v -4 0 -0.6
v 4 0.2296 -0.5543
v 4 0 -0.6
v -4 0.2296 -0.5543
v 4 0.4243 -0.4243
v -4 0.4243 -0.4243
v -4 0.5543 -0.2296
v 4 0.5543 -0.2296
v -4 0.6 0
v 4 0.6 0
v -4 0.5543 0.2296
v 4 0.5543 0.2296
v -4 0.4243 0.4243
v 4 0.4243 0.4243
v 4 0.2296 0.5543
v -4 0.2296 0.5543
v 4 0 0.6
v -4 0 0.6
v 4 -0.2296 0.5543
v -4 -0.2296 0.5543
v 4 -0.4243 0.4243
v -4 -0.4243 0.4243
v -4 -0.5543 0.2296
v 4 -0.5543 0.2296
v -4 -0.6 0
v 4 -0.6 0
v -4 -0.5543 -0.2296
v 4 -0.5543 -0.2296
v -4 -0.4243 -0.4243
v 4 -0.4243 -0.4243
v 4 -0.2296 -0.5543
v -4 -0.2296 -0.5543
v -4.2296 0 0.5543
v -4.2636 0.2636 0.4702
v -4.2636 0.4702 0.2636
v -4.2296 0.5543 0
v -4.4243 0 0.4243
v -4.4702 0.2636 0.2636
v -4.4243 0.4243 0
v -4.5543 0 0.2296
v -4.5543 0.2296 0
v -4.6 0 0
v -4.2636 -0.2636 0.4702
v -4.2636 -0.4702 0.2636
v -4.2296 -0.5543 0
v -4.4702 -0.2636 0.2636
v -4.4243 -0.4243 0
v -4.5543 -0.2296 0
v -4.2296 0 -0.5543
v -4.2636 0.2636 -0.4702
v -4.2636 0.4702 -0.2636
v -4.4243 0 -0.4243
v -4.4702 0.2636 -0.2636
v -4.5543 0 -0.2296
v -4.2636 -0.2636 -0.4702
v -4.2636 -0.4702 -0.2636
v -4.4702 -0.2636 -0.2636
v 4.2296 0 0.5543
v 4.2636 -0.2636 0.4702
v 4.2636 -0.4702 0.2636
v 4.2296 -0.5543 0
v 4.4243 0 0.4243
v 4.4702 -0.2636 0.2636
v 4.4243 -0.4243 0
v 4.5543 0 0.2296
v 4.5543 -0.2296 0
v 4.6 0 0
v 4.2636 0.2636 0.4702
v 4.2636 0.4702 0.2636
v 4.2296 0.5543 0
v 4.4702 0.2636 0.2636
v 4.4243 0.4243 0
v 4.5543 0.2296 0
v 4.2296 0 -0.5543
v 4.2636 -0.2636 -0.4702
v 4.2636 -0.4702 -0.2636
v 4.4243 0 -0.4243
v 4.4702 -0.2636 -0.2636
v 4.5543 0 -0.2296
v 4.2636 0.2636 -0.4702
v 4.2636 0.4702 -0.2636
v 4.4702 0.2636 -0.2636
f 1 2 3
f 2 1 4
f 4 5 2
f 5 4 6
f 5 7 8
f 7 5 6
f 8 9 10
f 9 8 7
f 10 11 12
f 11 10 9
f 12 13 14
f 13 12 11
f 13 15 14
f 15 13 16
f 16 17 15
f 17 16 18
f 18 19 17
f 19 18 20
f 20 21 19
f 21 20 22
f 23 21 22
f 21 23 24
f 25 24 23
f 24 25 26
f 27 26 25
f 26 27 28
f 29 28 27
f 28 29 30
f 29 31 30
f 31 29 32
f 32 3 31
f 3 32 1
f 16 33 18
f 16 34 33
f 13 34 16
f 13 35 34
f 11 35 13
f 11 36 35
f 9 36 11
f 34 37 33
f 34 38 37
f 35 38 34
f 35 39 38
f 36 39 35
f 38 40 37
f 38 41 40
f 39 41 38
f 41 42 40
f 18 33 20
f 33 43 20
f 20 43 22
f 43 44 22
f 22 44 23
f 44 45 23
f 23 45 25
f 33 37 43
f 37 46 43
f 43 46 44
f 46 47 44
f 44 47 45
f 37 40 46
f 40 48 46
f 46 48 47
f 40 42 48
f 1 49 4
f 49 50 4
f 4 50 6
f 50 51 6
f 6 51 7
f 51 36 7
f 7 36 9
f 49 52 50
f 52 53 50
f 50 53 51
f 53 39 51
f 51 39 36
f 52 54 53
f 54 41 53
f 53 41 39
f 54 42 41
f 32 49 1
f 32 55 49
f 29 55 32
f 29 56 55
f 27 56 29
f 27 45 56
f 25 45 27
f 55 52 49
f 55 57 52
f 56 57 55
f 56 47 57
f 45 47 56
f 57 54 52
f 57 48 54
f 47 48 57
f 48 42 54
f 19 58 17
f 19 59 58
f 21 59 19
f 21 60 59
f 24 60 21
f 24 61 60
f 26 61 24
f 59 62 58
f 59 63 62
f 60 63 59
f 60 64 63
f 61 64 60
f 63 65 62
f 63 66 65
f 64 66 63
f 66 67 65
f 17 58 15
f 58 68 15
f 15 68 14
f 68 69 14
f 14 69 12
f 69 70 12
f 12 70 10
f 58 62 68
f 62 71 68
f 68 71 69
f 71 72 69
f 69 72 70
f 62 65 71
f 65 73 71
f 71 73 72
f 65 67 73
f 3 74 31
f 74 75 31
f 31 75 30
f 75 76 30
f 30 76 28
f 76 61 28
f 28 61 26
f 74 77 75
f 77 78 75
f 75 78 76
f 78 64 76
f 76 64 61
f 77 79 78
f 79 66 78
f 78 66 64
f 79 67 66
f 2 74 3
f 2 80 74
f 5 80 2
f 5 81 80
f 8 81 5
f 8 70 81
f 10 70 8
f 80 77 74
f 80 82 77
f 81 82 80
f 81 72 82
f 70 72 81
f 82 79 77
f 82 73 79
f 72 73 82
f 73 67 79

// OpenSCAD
// file: ../p/1-8sphe.scad
use <../lib.scad>
function ldraw_lib__1_8sphe() = [
// 0 Sphere 0.125
// 0 Name: 1-8sphe.dat
// 0 Author: James Jessiman
// 0 !LDRAW_ORG Primitive UPDATE 2012-03
// 0 !LICENSE Licensed under CC BY 2.0 and CC BY 4.0 : see CAreadme.txt
// 
// 0 BFC CERTIFY CCW
  [0,"BFC","CERTIFY"],
  [0,"BFC","CCW"],
// 
// 0 !HISTORY 2000-08-01 {Axel Poque} fixes to resolve L3P error messages.
// 0 !HISTORY 2000-08-01 {Manfred Moolhuysen} fixes to resolve L3P error messages.
// 0 !HISTORY 2000-09-30 [PTadmin] Official Update 2000-02
// 0 !HISTORY 2002-03-28 [hafhead] Made BFC compliant
// 0 !HISTORY 2002-04-25 [PTadmin] Official Update 2002-02
// 0 !HISTORY 2007-06-22 [PTadmin] Header formatted for Contributor Agreement
// 0 !HISTORY 2008-07-01 [PTadmin] Official Update 2008-01
// 0 !HISTORY 2010-09-12 [MagFors] Changed winding, removed duplicated cond-line, optimized filesize
// 0 !HISTORY 2010-12-31 [PTadmin] Official Update 2010-03
// 0 !HISTORY 2012-07-01 [tcobbs] Replaced with geometry from LDView
// 0 !HISTORY 2012-12-28 [PTadmin] Official Update 2012-03
// 
// 
// 3 16 1 0 0 0.9239 0.3827 0 0.9239 0 0.3827
  [3,16,1,0,0,0.9239,0.3827,0,0.9239,0,0.3827],
// 3 16 0.9239 0.3827 0 0.7836 0.4393 0.4393 0.9239 0 0.3827
  [3,16,0.9239,0.3827,0,0.7836,0.4393,0.4393,0.9239,0,0.3827],
// 3 16 0.9239 0 0.3827 0.7836 0.4393 0.4393 0.7071 0 0.7071
  [3,16,0.9239,0,0.3827,0.7836,0.4393,0.4393,0.7071,0,0.7071],
// 3 16 0.7836 0.4393 0.4393 0.4393 0.4393 0.7836 0.7071 0 0.7071
  [3,16,0.7836,0.4393,0.4393,0.4393,0.4393,0.7836,0.7071,0,0.7071],
// 3 16 0.7071 0 0.7071 0.4393 0.4393 0.7836 0.3827 0 0.9239
  [3,16,0.7071,0,0.7071,0.4393,0.4393,0.7836,0.3827,0,0.9239],
// 3 16 0.4393 0.4393 0.7836 0 0.3827 0.9239 0.3827 0 0.9239
  [3,16,0.4393,0.4393,0.7836,0,0.3827,0.9239,0.3827,0,0.9239],
// 3 16 0.3827 0 0.9239 0 0.3827 0.9239 0 0 1
  [3,16,0.3827,0,0.9239,0,0.3827,0.9239,0,0,1],
// 3 16 0.9239 0.3827 0 0.7071 0.7071 0 0.7836 0.4393 0.4393
  [3,16,0.9239,0.3827,0,0.7071,0.7071,0,0.7836,0.4393,0.4393],
// 3 16 0.7071 0.7071 0 0.4393 0.7836 0.4393 0.7836 0.4393 0.4393
  [3,16,0.7071,0.7071,0,0.4393,0.7836,0.4393,0.7836,0.4393,0.4393],
// 3 16 0.7836 0.4393 0.4393 0.4393 0.7836 0.4393 0.4393 0.4393 0.7836
  [3,16,0.7836,0.4393,0.4393,0.4393,0.7836,0.4393,0.4393,0.4393,0.7836],
// 3 16 0.4393 0.7836 0.4393 0 0.7071 0.7071 0.4393 0.4393 0.7836
  [3,16,0.4393,0.7836,0.4393,0,0.7071,0.7071,0.4393,0.4393,0.7836],
// 3 16 0.4393 0.4393 0.7836 0 0.7071 0.7071 0 0.3827 0.9239
  [3,16,0.4393,0.4393,0.7836,0,0.7071,0.7071,0,0.3827,0.9239],
// 3 16 0.7071 0.7071 0 0.3827 0.9239 0 0.4393 0.7836 0.4393
  [3,16,0.7071,0.7071,0,0.3827,0.9239,0,0.4393,0.7836,0.4393],
// 3 16 0.3827 0.9239 0 0 0.9239 0.3827 0.4393 0.7836 0.4393
  [3,16,0.3827,0.9239,0,0,0.9239,0.3827,0.4393,0.7836,0.4393],
// 3 16 0.4393 0.7836 0.4393 0 0.9239 0.3827 0 0.7071 0.7071
  [3,16,0.4393,0.7836,0.4393,0,0.9239,0.3827,0,0.7071,0.7071],
// 3 16 0.3827 0.9239 0 0 1 0 0 0.9239 0.3827
  [3,16,0.3827,0.9239,0,0,1,0,0,0.9239,0.3827],
// 
// 5 24 1 0 0 0.9239 0.3827 0 1 0 -0.1 0.9239 0 0.3827
  [5,24,1,0,0,0.9239,0.3827,0,1,0,-0.1,0.9239,0,0.3827],
// 5 24 0.9239 0.3827 0 0.9239 0 0.3827 1 0 0 0.7836 0.4393 0.4393
  [5,24,0.9239,0.3827,0,0.9239,0,0.3827,1,0,0,0.7836,0.4393,0.4393],
// 5 24 1 0 0 0.9239 0 0.3827 0.9239 0.3827 0 1 -0.1 0
  [5,24,1,0,0,0.9239,0,0.3827,0.9239,0.3827,0,1,-0.1,0],
// 5 24 0.9239 0 0.3827 0.7836 0.4393 0.4393 0.9239 0.3827 0 0.7071 0 0.7071
  [5,24,0.9239,0,0.3827,0.7836,0.4393,0.4393,0.9239,0.3827,0,0.7071,0,0.7071],
// 5 24 0.7836 0.4393 0.4393 0.7071 0 0.7071 0.9239 0 0.3827 0.4393 0.4393 0.7836
  [5,24,0.7836,0.4393,0.4393,0.7071,0,0.7071,0.9239,0,0.3827,0.4393,0.4393,0.7836],
// 5 24 0.9239 0 0.3827 0.7071 0 0.7071 0.7836 0.4393 0.4393 0.9239 -0.1 0.3827
  [5,24,0.9239,0,0.3827,0.7071,0,0.7071,0.7836,0.4393,0.4393,0.9239,-0.1,0.3827],
// 5 24 0.7071 0 0.7071 0.4393 0.4393 0.7836 0.7836 0.4393 0.4393 0.3827 0 0.9239
  [5,24,0.7071,0,0.7071,0.4393,0.4393,0.7836,0.7836,0.4393,0.4393,0.3827,0,0.9239],
// 5 24 0.4393 0.4393 0.7836 0.3827 0 0.9239 0.7071 0 0.7071 0 0.3827 0.9239
  [5,24,0.4393,0.4393,0.7836,0.3827,0,0.9239,0.7071,0,0.7071,0,0.3827,0.9239],
// 5 24 0.7071 0 0.7071 0.3827 0 0.9239 0.4393 0.4393 0.7836 0.7071 -0.1 0.7071
  [5,24,0.7071,0,0.7071,0.3827,0,0.9239,0.4393,0.4393,0.7836,0.7071,-0.1,0.7071],
// 5 24 0.3827 0 0.9239 0 0.3827 0.9239 0.4393 0.4393 0.7836 0 0 1
  [5,24,0.3827,0,0.9239,0,0.3827,0.9239,0.4393,0.4393,0.7836,0,0,1],
// 5 24 0 0.3827 0.9239 0 0 1 0.3827 0 0.9239 -0.1 0.3827 0.9239
  [5,24,0,0.3827,0.9239,0,0,1,0.3827,0,0.9239,-0.1,0.3827,0.9239],
// 5 24 0.3827 0 0.9239 0 0 1 0 0.3827 0.9239 0.3827 -0.1 0.9239
  [5,24,0.3827,0,0.9239,0,0,1,0,0.3827,0.9239,0.3827,-0.1,0.9239],
// 5 24 0.9239 0.3827 0 0.7071 0.7071 0 0.9239 0.3827 -0.1 0.7836 0.4393 0.4393
  [5,24,0.9239,0.3827,0,0.7071,0.7071,0,0.9239,0.3827,-0.1,0.7836,0.4393,0.4393],
// 5 24 0.7071 0.7071 0 0.7836 0.4393 0.4393 0.9239 0.3827 0 0.4393 0.7836 0.4393
  [5,24,0.7071,0.7071,0,0.7836,0.4393,0.4393,0.9239,0.3827,0,0.4393,0.7836,0.4393],
// 5 24 0.9239 0.3827 0 0.7836 0.4393 0.4393 0.7071 0.7071 0 0.9239 0 0.3827
  [5,24,0.9239,0.3827,0,0.7836,0.4393,0.4393,0.7071,0.7071,0,0.9239,0,0.3827],
// 5 24 0.7836 0.4393 0.4393 0.4393 0.7836 0.4393 0.7071 0.7071 0 0.4393 0.4393 0.7836
  [5,24,0.7836,0.4393,0.4393,0.4393,0.7836,0.4393,0.7071,0.7071,0,0.4393,0.4393,0.7836],
// 5 24 0.4393 0.7836 0.4393 0.4393 0.4393 0.7836 0.7836 0.4393 0.4393 0 0.7071 0.7071
  [5,24,0.4393,0.7836,0.4393,0.4393,0.4393,0.7836,0.7836,0.4393,0.4393,0,0.7071,0.7071],
// 5 24 0.7836 0.4393 0.4393 0.4393 0.4393 0.7836 0.4393 0.7836 0.4393 0.7071 0 0.7071
  [5,24,0.7836,0.4393,0.4393,0.4393,0.4393,0.7836,0.4393,0.7836,0.4393,0.7071,0,0.7071],
// 5 24 0.4393 0.4393 0.7836 0 0.7071 0.7071 0.4393 0.7836 0.4393 0 0.3827 0.9239
  [5,24,0.4393,0.4393,0.7836,0,0.7071,0.7071,0.4393,0.7836,0.4393,0,0.3827,0.9239],
// 5 24 0 0.7071 0.7071 0 0.3827 0.9239 0.4393 0.4393 0.7836 -0.1 0.7071 0.7071
  [5,24,0,0.7071,0.7071,0,0.3827,0.9239,0.4393,0.4393,0.7836,-0.1,0.7071,0.7071],
// 5 24 0.4393 0.4393 0.7836 0 0.3827 0.9239 0 0.7071 0.7071 0.3827 0 0.9239
  [5,24,0.4393,0.4393,0.7836,0,0.3827,0.9239,0,0.7071,0.7071,0.3827,0,0.9239],
// 5 24 0.7071 0.7071 0 0.3827 0.9239 0 0.7071 0.7071 -0.1 0.4393 0.7836 0.4393
  [5,24,0.7071,0.7071,0,0.3827,0.9239,0,0.7071,0.7071,-0.1,0.4393,0.7836,0.4393],
// 5 24 0.3827 0.9239 0 0.4393 0.7836 0.4393 0.7071 0.7071 0 0 0.9239 0.3827
  [5,24,0.3827,0.9239,0,0.4393,0.7836,0.4393,0.7071,0.7071,0,0,0.9239,0.3827],
// 5 24 0.7071 0.7071 0 0.4393 0.7836 0.4393 0.3827 0.9239 0 0.7836 0.4393 0.4393
  [5,24,0.7071,0.7071,0,0.4393,0.7836,0.4393,0.3827,0.9239,0,0.7836,0.4393,0.4393],
// 5 24 0.4393 0.7836 0.4393 0 0.9239 0.3827 0.3827 0.9239 0 0 0.7071 0.7071
  [5,24,0.4393,0.7836,0.4393,0,0.9239,0.3827,0.3827,0.9239,0,0,0.7071,0.7071],
// 5 24 0 0.9239 0.3827 0 0.7071 0.7071 0.4393 0.7836 0.4393 -0.1 0.9239 0.3827
  [5,24,0,0.9239,0.3827,0,0.7071,0.7071,0.4393,0.7836,0.4393,-0.1,0.9239,0.3827],
// 5 24 0.4393 0.7836 0.4393 0 0.7071 0.7071 0 0.9239 0.3827 0.4393 0.4393 0.7836
  [5,24,0.4393,0.7836,0.4393,0,0.7071,0.7071,0,0.9239,0.3827,0.4393,0.4393,0.7836],
// 5 24 0.3827 0.9239 0 0 1 0 0.3827 0.9239 -0.1 0 0.9239 0.3827
  [5,24,0.3827,0.9239,0,0,1,0,0.3827,0.9239,-0.1,0,0.9239,0.3827],
// 5 24 0 1 0 0 0.9239 0.3827 0.3827 0.9239 0 -0.1 1 0
  [5,24,0,1,0,0,0.9239,0.3827,0.3827,0.9239,0,-0.1,1,0],
// 5 24 0.3827 0.9239 0 0 0.9239 0.3827 0 1 0 0.4393 0.7836 0.4393
  [5,24,0.3827,0.9239,0,0,0.9239,0.3827,0,1,0,0.4393,0.7836,0.4393],
];
makepoly(ldraw_lib__1_8sphe(), line=0.2);
// file: ../p/4-8sphe.scad
use <../lib.scad>
use <1-8sphe.scad>
function ldraw_lib__4_8sphe() = [
// 0 Sphere 0.5
// 0 Name: 4-8sphe.dat
// 0 Author: James Jessiman
// 0 !LDRAW_ORG Primitive UPDATE 2003-02
// 0 !LICENSE Licensed under CC BY 2.0 and CC BY 4.0 : see CAreadme.txt
// 
// 0 BFC CERTIFY CCW
  [0,"BFC","CERTIFY"],
  [0,"BFC","CCW"],
// 
// 0 !HISTORY 2002-08-31 [izanette] Modified with WINDZ for BFC compliance
// 0 !HISTORY 2003-08-01 [PTadmin] Official Update 2003-02
// 0 !HISTORY 2007-06-24 [PTadmin] Header formatted for Contributor Agreement
// 0 !HISTORY 2008-07-01 [PTadmin] Official Update 2008-01
// 
// 
// 1 16 0 0 0 1 0 0 0 1 0 0 0 1 1-8sphe.dat
  [1,16,0,0,0,1,0,0,0,1,0,0,0,1, ldraw_lib__1_8sphe()],
// 1 16 0 0 0 1 0 0 0 1 0 0 0 -1 1-8sphe.dat
  [1,16,0,0,0,1,0,0,0,1,0,0,0,-1, ldraw_lib__1_8sphe()],
// 1 16 0 0 0 -1 0 0 0 1 0 0 0 1 1-8sphe.dat
  [1,16,0,0,0,-1,0,0,0,1,0,0,0,1, ldraw_lib__1_8sphe()],
// 1 16 0 0 0 -1 0 0 0 1 0 0 0 -1 1-8sphe.dat
  [1,16,0,0,0,-1,0,0,0,1,0,0,0,-1, ldraw_lib__1_8sphe()],
// 0
// 
];
makepoly(ldraw_lib__4_8sphe(), line=0.2);
// file: ../p/4-4cyli.scad
use <../lib.scad>
function ldraw_lib__4_4cyli() = [
// 0 Cylinder 1.0
// 0 Name: 4-4cyli.dat
// 0 Author: James Jessiman
// 0 !LDRAW_ORG Primitive UPDATE 2005-01
// 0 !LICENSE Licensed under CC BY 2.0 and CC BY 4.0 : see CAreadme.txt
// 
// 0 BFC CERTIFY CCW
  [0,"BFC","CERTIFY"],
  [0,"BFC","CCW"],
// 
// 0 !HISTORY 1998-12-15 [PTadmin] Official Update 1998-10
// 0 !HISTORY 2002-03-23 [sbliss] Added BFC statement; merged headers from files in distributions LDraw 0.27 and Complete.
// 0 !HISTORY 2002-04-25 [PTadmin] Official Update 2002-02
// 0 !HISTORY 2004-12-14 [guyvivan] BFC CCW
// 0 !HISTORY 2005-12-28 [PTadmin] Official Update 2005-01
// 0 !HISTORY 2007-06-24 [PTadmin] Header formatted for Contributor Agreement
// 0 !HISTORY 2008-07-01 [PTadmin] Official Update 2008-01
// 
// 
// 4 16 1 1 0 0.9239 1 0.3827 0.9239 0 0.3827 1 0 0
  [4,16,1,1,0,0.9239,1,0.3827,0.9239,0,0.3827,1,0,0],
// 5 24 1 0 0 1 1 0 0.9239 0 0.3827 0.9239 0 -0.3827
  [5,24,1,0,0,1,1,0,0.9239,0,0.3827,0.9239,0,-0.3827],
// 4 16 0.9239 1 0.3827 0.7071 1 0.7071 0.7071 0 0.7071 0.9239 0 0.3827
  [4,16,0.9239,1,0.3827,0.7071,1,0.7071,0.7071,0,0.7071,0.9239,0,0.3827],
// 5 24 0.9239 0 0.3827 0.9239 1 0.3827 0.7071 0 0.7071 1 0 0
  [5,24,0.9239,0,0.3827,0.9239,1,0.3827,0.7071,0,0.7071,1,0,0],
// 4 16 0.7071 1 0.7071 0.3827 1 0.9239 0.3827 0 0.9239 0.7071 0 0.7071
  [4,16,0.7071,1,0.7071,0.3827,1,0.9239,0.3827,0,0.9239,0.7071,0,0.7071],
// 5 24 0.7071 0 0.7071 0.7071 1 0.7071 0.3827 0 0.9239 0.9239 0 0.3827
  [5,24,0.7071,0,0.7071,0.7071,1,0.7071,0.3827,0,0.9239,0.9239,0,0.3827],
// 4 16 0.3827 1 0.9239 0 1 1 0 0 1 0.3827 0 0.9239
  [4,16,0.3827,1,0.9239,0,1,1,0,0,1,0.3827,0,0.9239],
// 5 24 0.3827 0 0.9239 0.3827 1 0.9239 0 0 1 0.7071 0 0.7071
  [5,24,0.3827,0,0.9239,0.3827,1,0.9239,0,0,1,0.7071,0,0.7071],
// 4 16 0 1 1 -0.3827 1 0.9239 -0.3827 0 0.9239 0 0 1
  [4,16,0,1,1,-0.3827,1,0.9239,-0.3827,0,0.9239,0,0,1],
// 5 24 0 0 1 0 1 1 -0.3827 0 0.9239 0.3827 0 0.9239
  [5,24,0,0,1,0,1,1,-0.3827,0,0.9239,0.3827,0,0.9239],
// 4 16 -0.3827 1 0.9239 -0.7071 1 0.7071 -0.7071 0 0.7071 -0.3827 0 0.9239
  [4,16,-0.3827,1,0.9239,-0.7071,1,0.7071,-0.7071,0,0.7071,-0.3827,0,0.9239],
// 5 24 -0.3827 0 0.9239 -0.3827 1 0.9239 -0.7071 0 0.7071 0 0 1
  [5,24,-0.3827,0,0.9239,-0.3827,1,0.9239,-0.7071,0,0.7071,0,0,1],
// 4 16 -0.7071 1 0.7071 -0.9239 1 0.3827 -0.9239 0 0.3827 -0.7071 0 0.7071
  [4,16,-0.7071,1,0.7071,-0.9239,1,0.3827,-0.9239,0,0.3827,-0.7071,0,0.7071],
// 5 24 -0.7071 0 0.7071 -0.7071 1 0.7071 -0.9239 0 0.3827 -0.3827 0 0.9239
  [5,24,-0.7071,0,0.7071,-0.7071,1,0.7071,-0.9239,0,0.3827,-0.3827,0,0.9239],
// 4 16 -0.9239 1 0.3827 -1 1 0 -1 0 0 -0.9239 0 0.3827
  [4,16,-0.9239,1,0.3827,-1,1,0,-1,0,0,-0.9239,0,0.3827],
// 5 24 -0.9239 0 0.3827 -0.9239 1 0.3827 -1 0 0 -0.7071 0 0.7071
  [5,24,-0.9239,0,0.3827,-0.9239,1,0.3827,-1,0,0,-0.7071,0,0.7071],
// 4 16 -1 1 0 -0.9239 1 -0.3827 -0.9239 0 -0.3827 -1 0 0
  [4,16,-1,1,0,-0.9239,1,-0.3827,-0.9239,0,-0.3827,-1,0,0],
// 5 24 -1 0 0 -1 1 0 -0.9239 0 -0.3827 -0.9239 0 0.3827
  [5,24,-1,0,0,-1,1,0,-0.9239,0,-0.3827,-0.9239,0,0.3827],
// 4 16 -0.9239 1 -0.3827 -0.7071 1 -0.7071 -0.7071 0 -0.7071 -0.9239 0 -0.3827
  [4,16,-0.9239,1,-0.3827,-0.7071,1,-0.7071,-0.7071,0,-0.7071,-0.9239,0,-0.3827],
// 5 24 -0.9239 0 -0.3827 -0.9239 1 -0.3827 -0.7071 0 -0.7071 -1 0 0
  [5,24,-0.9239,0,-0.3827,-0.9239,1,-0.3827,-0.7071,0,-0.7071,-1,0,0],
// 4 16 -0.7071 1 -0.7071 -0.3827 1 -0.9239 -0.3827 0 -0.9239 -0.7071 0 -0.7071
  [4,16,-0.7071,1,-0.7071,-0.3827,1,-0.9239,-0.3827,0,-0.9239,-0.7071,0,-0.7071],
// 5 24 -0.7071 0 -0.7071 -0.7071 1 -0.7071 -0.3827 0 -0.9239 -0.9239 0 -0.3827
  [5,24,-0.7071,0,-0.7071,-0.7071,1,-0.7071,-0.3827,0,-0.9239,-0.9239,0,-0.3827],
// 4 16 -0.3827 1 -0.9239 0 1 -1 0 0 -1 -0.3827 0 -0.9239
  [4,16,-0.3827,1,-0.9239,0,1,-1,0,0,-1,-0.3827,0,-0.9239],
// 5 24 -0.3827 0 -0.9239 -0.3827 1 -0.9239 0 0 -1 -0.7071 0 -0.7071
  [5,24,-0.3827,0,-0.9239,-0.3827,1,-0.9239,0,0,-1,-0.7071,0,-0.7071],
// 4 16 0 1 -1 0.3827 1 -0.9239 0.3827 0 -0.9239 0 0 -1
  [4,16,0,1,-1,0.3827,1,-0.9239,0.3827,0,-0.9239,0,0,-1],
// 5 24 0 0 -1 0 1 -1 0.3827 0 -0.9239 -0.3827 0 -0.9239
  [5,24,0,0,-1,0,1,-1,0.3827,0,-0.9239,-0.3827,0,-0.9239],
// 4 16 0.3827 1 -0.9239 0.7071 1 -0.7071 0.7071 0 -0.7071 0.3827 0 -0.9239
  [4,16,0.3827,1,-0.9239,0.7071,1,-0.7071,0.7071,0,-0.7071,0.3827,0,-0.9239],
// 5 24 0.3827 0 -0.9239 0.3827 1 -0.9239 0.7071 0 -0.7071 0 0 -1
  [5,24,0.3827,0,-0.9239,0.3827,1,-0.9239,0.7071,0,-0.7071,0,0,-1],
// 4 16 0.7071 1 -0.7071 0.9239 1 -0.3827 0.9239 0 -0.3827 0.7071 0 -0.7071
  [4,16,0.7071,1,-0.7071,0.9239,1,-0.3827,0.9239,0,-0.3827,0.7071,0,-0.7071],
// 5 24 0.7071 0 -0.7071 0.7071 1 -0.7071 0.9239 0 -0.3827 0.3827 0 -0.9239
  [5,24,0.7071,0,-0.7071,0.7071,1,-0.7071,0.9239,0,-0.3827,0.3827,0,-0.9239],
// 4 16 0.9239 1 -0.3827 1 1 0 1 0 0 0.9239 0 -0.3827
  [4,16,0.9239,1,-0.3827,1,1,0,1,0,0,0.9239,0,-0.3827],
// 5 24 0.9239 0 -0.3827 0.9239 1 -0.3827 1 0 0 0.7071 0 -0.7071
  [5,24,0.9239,0,-0.3827,0.9239,1,-0.3827,1,0,0,0.7071,0,-0.7071],
// 0
];
makepoly(ldraw_lib__4_4cyli(), line=0.2);
// main file
use <../lib.scad>
use <../p/4-4cyli.scad>
use <../p/4-8sphe.scad>
function ldraw_lib__572b() = [
// 0 ~String Braided Segment 1L
// 0 Name: 572b.dat
// 0 Author: Steve Bliss [sbliss]
// 0 !LDRAW_ORG Part UPDATE 2005-01
// 0 !LICENSE Licensed under CC BY 2.0 and CC BY 4.0 : see CAreadme.txt
// 
// 0 BFC CERTIFY CCW
  [0,"BFC","CERTIFY"],
  [0,"BFC","CCW"],
// 
// 0 !HISTORY 2005-12-28 [PTadmin] Official Update 2005-01
// 0 !HISTORY 2007-07-09 [PTadmin] Header formatted for Contributor Agreement
// 0 !HISTORY 2008-07-01 [PTadmin] Official Update 2008-01
// 
// 
// 1 16 -10 0 0 0 20 0 1.5 0 0 0 0 1.5 4-4cyli.dat
  [1,16,-10,0,0,0,20,0,1.5,0,0,0,0,1.5, ldraw_lib__4_4cyli()],
// 1 16 -10 0 0 0 -1.5 0 -1.5 0 0 0 0 1.5 4-8sphe.dat
  [1,16,-10,0,0,0,-1.5,0,-1.5,0,0,0,0,1.5, ldraw_lib__4_8sphe()],
// 1 16 10 0 0 0 1.5 0 -1.5 0 0 0 0 -1.5 4-8sphe.dat
  [1,16,10,0,0,0,1.5,0,-1.5,0,0,0,0,-1.5, ldraw_lib__4_8sphe()],
// 
// 2 16 -10 -1.5 0 -9.75 -1.386 -.574
  [2,16,-10,-1.5,0,-9.75,-1.386,-.574],
// 2 16 -9.75 -1.386 -.574 -9.5 -1.061 -1.061
  [2,16,-9.75,-1.386,-.574,-9.5,-1.061,-1.061],
// 2 16 -9.5 -1.061 -1.061 -9.25 -.574 -1.386
  [2,16,-9.5,-1.061,-1.061,-9.25,-.574,-1.386],
// 2 16 -9.25 -.574 -1.386 -9 0 -1.5
  [2,16,-9.25,-.574,-1.386,-9,0,-1.5],
// 2 16 -9 0 -1.5 -8.75 .574 -1.386
  [2,16,-9,0,-1.5,-8.75,.574,-1.386],
// 2 16 -8.75 .574 -1.386 -8.5 1.061 -1.061
  [2,16,-8.75,.574,-1.386,-8.5,1.061,-1.061],
// 2 16 -8.5 1.061 -1.061 -8.25 1.386 -.574
  [2,16,-8.5,1.061,-1.061,-8.25,1.386,-.574],
// 2 16 -8.25 1.386 -.574 -8 1.5 0
  [2,16,-8.25,1.386,-.574,-8,1.5,0],
// 2 16 -8 1.5 0 -7.75 1.386 .574
  [2,16,-8,1.5,0,-7.75,1.386,.574],
// 2 16 -7.75 1.386 .574 -7.5 1.061 1.061
  [2,16,-7.75,1.386,.574,-7.5,1.061,1.061],
// 2 16 -7.5 1.061 1.061 -7.25 .574 1.386
  [2,16,-7.5,1.061,1.061,-7.25,.574,1.386],
// 2 16 -7.25 .574 1.386 -7 0 1.5
  [2,16,-7.25,.574,1.386,-7,0,1.5],
// 2 16 -7 0 1.5 -6.75 -.574 1.386
  [2,16,-7,0,1.5,-6.75,-.574,1.386],
// 2 16 -6.75 -.574 1.386 -6.5 -1.061 1.061
  [2,16,-6.75,-.574,1.386,-6.5,-1.061,1.061],
// 2 16 -6.5 -1.061 1.061 -6.25 -1.386 .574
  [2,16,-6.5,-1.061,1.061,-6.25,-1.386,.574],
// 2 16 -6.25 -1.386 .574 -6 -1.5 0
  [2,16,-6.25,-1.386,.574,-6,-1.5,0],
// 2 16 -6 -1.5 0 -5.75 -1.386 -.574
  [2,16,-6,-1.5,0,-5.75,-1.386,-.574],
// 2 16 -5.75 -1.386 -.574 -5.5 -1.061 -1.061
  [2,16,-5.75,-1.386,-.574,-5.5,-1.061,-1.061],
// 2 16 -5.5 -1.061 -1.061 -5.25 -.574 -1.386
  [2,16,-5.5,-1.061,-1.061,-5.25,-.574,-1.386],
// 2 16 -5.25 -.574 -1.386 -5 0 -1.5
  [2,16,-5.25,-.574,-1.386,-5,0,-1.5],
// 2 16 -5 0 -1.5 -4.75 .574 -1.386
  [2,16,-5,0,-1.5,-4.75,.574,-1.386],
// 2 16 -4.75 .574 -1.386 -4.5 1.061 -1.061
  [2,16,-4.75,.574,-1.386,-4.5,1.061,-1.061],
// 2 16 -4.5 1.061 -1.061 -4.25 1.386 -.574
  [2,16,-4.5,1.061,-1.061,-4.25,1.386,-.574],
// 2 16 -4.25 1.386 -.574 -4 1.5 0
  [2,16,-4.25,1.386,-.574,-4,1.5,0],
// 2 16 -4 1.5 0 -3.75 1.386 .574
  [2,16,-4,1.5,0,-3.75,1.386,.574],
// 2 16 -3.75 1.386 .574 -3.5 1.061 1.061
  [2,16,-3.75,1.386,.574,-3.5,1.061,1.061],
// 2 16 -3.5 1.061 1.061 -3.25 .574 1.386
  [2,16,-3.5,1.061,1.061,-3.25,.574,1.386],
// 2 16 -3.25 .574 1.386 -3 0 1.5
  [2,16,-3.25,.574,1.386,-3,0,1.5],
// 2 16 -3 0 1.5 -2.75 -.574 1.386
  [2,16,-3,0,1.5,-2.75,-.574,1.386],
// 2 16 -2.75 -.574 1.386 -2.5 -1.061 1.061
  [2,16,-2.75,-.574,1.386,-2.5,-1.061,1.061],
// 2 16 -2.5 -1.061 1.061 -2.25 -1.386 .574
  [2,16,-2.5,-1.061,1.061,-2.25,-1.386,.574],
// 2 16 -2.25 -1.386 .574 -2 -1.5 0
  [2,16,-2.25,-1.386,.574,-2,-1.5,0],
// 2 16 -2 -1.5 0 -1.75 -1.386 -.574
  [2,16,-2,-1.5,0,-1.75,-1.386,-.574],
// 2 16 -1.75 -1.386 -.574 -1.5 -1.061 -1.061
  [2,16,-1.75,-1.386,-.574,-1.5,-1.061,-1.061],
// 2 16 -1.5 -1.061 -1.061 -1.25 -.574 -1.386
  [2,16,-1.5,-1.061,-1.061,-1.25,-.574,-1.386],
// 2 16 -1.25 -.574 -1.386 -1 0 -1.5
  [2,16,-1.25,-.574,-1.386,-1,0,-1.5],
// 2 16 -1 0 -1.5 -.75 .574 -1.386
  [2,16,-1,0,-1.5,-.75,.574,-1.386],
// 2 16 -.75 .574 -1.386 -.5 1.061 -1.061
  [2,16,-.75,.574,-1.386,-.5,1.061,-1.061],
// 2 16 -.5 1.061 -1.061 -.25 1.386 -.574
  [2,16,-.5,1.061,-1.061,-.25,1.386,-.574],
// 2 16 -.25 1.386 -.574 0 1.5 0
  [2,16,-.25,1.386,-.574,0,1.5,0],
// 2 16 0 1.5 0 .25 1.386 .574
  [2,16,0,1.5,0,.25,1.386,.574],
// 2 16 .25 1.386 .574 .5 1.061 1.061
  [2,16,.25,1.386,.574,.5,1.061,1.061],
// 2 16 .5 1.061 1.061 .75 .574 1.386
  [2,16,.5,1.061,1.061,.75,.574,1.386],
// 2 16 .75 .574 1.386 1 0 1.5
  [2,16,.75,.574,1.386,1,0,1.5],
// 2 16 1 0 1.5 1.25 -.574 1.386
  [2,16,1,0,1.5,1.25,-.574,1.386],
// 2 16 1.25 -.574 1.386 1.5 -1.061 1.061
  [2,16,1.25,-.574,1.386,1.5,-1.061,1.061],
// 2 16 1.5 -1.061 1.061 1.75 -1.386 .574
  [2,16,1.5,-1.061,1.061,1.75,-1.386,.574],
// 2 16 1.75 -1.386 .574 2 -1.5 0
  [2,16,1.75,-1.386,.574,2,-1.5,0],
// 2 16 2 -1.5 0 2.25 -1.386 -.574
  [2,16,2,-1.5,0,2.25,-1.386,-.574],
// 2 16 2.25 -1.386 -.574 2.5 -1.061 -1.061
  [2,16,2.25,-1.386,-.574,2.5,-1.061,-1.061],
// 2 16 2.5 -1.061 -1.061 2.75 -.574 -1.386
  [2,16,2.5,-1.061,-1.061,2.75,-.574,-1.386],
// 2 16 2.75 -.574 -1.386 3 0 -1.5
  [2,16,2.75,-.574,-1.386,3,0,-1.5],
// 2 16 3 0 -1.5 3.25 .574 -1.386
  [2,16,3,0,-1.5,3.25,.574,-1.386],
// 2 16 3.25 .574 -1.386 3.5 1.061 -1.061
  [2,16,3.25,.574,-1.386,3.5,1.061,-1.061],
// 2 16 3.5 1.061 -1.061 3.75 1.386 -.574
  [2,16,3.5,1.061,-1.061,3.75,1.386,-.574],
// 2 16 3.75 1.386 -.574 4 1.5 0
  [2,16,3.75,1.386,-.574,4,1.5,0],
// 2 16 4 1.5 0 4.25 1.386 .574
  [2,16,4,1.5,0,4.25,1.386,.574],
// 2 16 4.25 1.386 .574 4.5 1.061 1.061
  [2,16,4.25,1.386,.574,4.5,1.061,1.061],
// 2 16 4.5 1.061 1.061 4.75 .574 1.386
  [2,16,4.5,1.061,1.061,4.75,.574,1.386],
// 2 16 4.75 .574 1.386 5 0 1.5
  [2,16,4.75,.574,1.386,5,0,1.5],
// 2 16 5 0 1.5 5.25 -.574 1.386
  [2,16,5,0,1.5,5.25,-.574,1.386],
// 2 16 5.25 -.574 1.386 5.5 -1.061 1.061
  [2,16,5.25,-.574,1.386,5.5,-1.061,1.061],
// 2 16 5.5 -1.061 1.061 5.75 -1.386 .574
  [2,16,5.5,-1.061,1.061,5.75,-1.386,.574],
// 2 16 5.75 -1.386 .574 6 -1.5 0
  [2,16,5.75,-1.386,.574,6,-1.5,0],
// 2 16 6 -1.5 0 6.25 -1.386 -.574
  [2,16,6,-1.5,0,6.25,-1.386,-.574],
// 2 16 6.25 -1.386 -.574 6.5 -1.061 -1.061
  [2,16,6.25,-1.386,-.574,6.5,-1.061,-1.061],
// 2 16 6.5 -1.061 -1.061 6.75 -.574 -1.386
  [2,16,6.5,-1.061,-1.061,6.75,-.574,-1.386],
// 2 16 6.75 -.574 -1.386 7 0 -1.5
  [2,16,6.75,-.574,-1.386,7,0,-1.5],
// 2 16 7 0 -1.5 7.25 .574 -1.386
  [2,16,7,0,-1.5,7.25,.574,-1.386],
// 2 16 7.25 .574 -1.386 7.5 1.061 -1.061
  [2,16,7.25,.574,-1.386,7.5,1.061,-1.061],
// 2 16 7.5 1.061 -1.061 7.75 1.386 -.574
  [2,16,7.5,1.061,-1.061,7.75,1.386,-.574],
// 2 16 7.75 1.386 -.574 8 1.5 0
  [2,16,7.75,1.386,-.574,8,1.5,0],
// 2 16 8 1.5 0 8.25 1.386 .574
  [2,16,8,1.5,0,8.25,1.386,.574],
// 2 16 8.25 1.386 .574 8.5 1.061 1.061
  [2,16,8.25,1.386,.574,8.5,1.061,1.061],
// 2 16 8.5 1.061 1.061 8.75 .574 1.386
  [2,16,8.5,1.061,1.061,8.75,.574,1.386],
// 2 16 8.75 .574 1.386 9 0 1.5
  [2,16,8.75,.574,1.386,9,0,1.5],
// 2 16 9 0 1.5 9.25 -.574 1.386
  [2,16,9,0,1.5,9.25,-.574,1.386],
// 2 16 9.25 -.574 1.386 9.5 -1.061 1.061
  [2,16,9.25,-.574,1.386,9.5,-1.061,1.061],
// 2 16 9.5 -1.061 1.061 9.75 -1.386 .574
  [2,16,9.5,-1.061,1.061,9.75,-1.386,.574],
// 2 16 9.75 -1.386 .574 10 -1.5 0
  [2,16,9.75,-1.386,.574,10,-1.5,0],
// 2 16 -10 1.5 0 -9.75 1.386 .574
  [2,16,-10,1.5,0,-9.75,1.386,.574],
// 2 16 -9.75 1.386 .574 -9.5 1.061 1.061
  [2,16,-9.75,1.386,.574,-9.5,1.061,1.061],
// 2 16 -9.5 1.061 1.061 -9.25 .574 1.386
  [2,16,-9.5,1.061,1.061,-9.25,.574,1.386],
// 2 16 -9.25 .574 1.386 -9 0 1.5
  [2,16,-9.25,.574,1.386,-9,0,1.5],
// 2 16 -9 0 1.5 -8.75 -.574 1.386
  [2,16,-9,0,1.5,-8.75,-.574,1.386],
// 2 16 -8.75 -.574 1.386 -8.5 -1.061 1.061
  [2,16,-8.75,-.574,1.386,-8.5,-1.061,1.061],
// 2 16 -8.5 -1.061 1.061 -8.25 -1.386 .574
  [2,16,-8.5,-1.061,1.061,-8.25,-1.386,.574],
// 2 16 -8.25 -1.386 .574 -8 -1.5 0
  [2,16,-8.25,-1.386,.574,-8,-1.5,0],
// 2 16 -8 -1.5 0 -7.75 -1.386 -.574
  [2,16,-8,-1.5,0,-7.75,-1.386,-.574],
// 2 16 -7.75 -1.386 -.574 -7.5 -1.061 -1.061
  [2,16,-7.75,-1.386,-.574,-7.5,-1.061,-1.061],
// 2 16 -7.5 -1.061 -1.061 -7.25 -.574 -1.386
  [2,16,-7.5,-1.061,-1.061,-7.25,-.574,-1.386],
// 2 16 -7.25 -.574 -1.386 -7 0 -1.5
  [2,16,-7.25,-.574,-1.386,-7,0,-1.5],
// 2 16 -7 0 -1.5 -6.75 .574 -1.386
  [2,16,-7,0,-1.5,-6.75,.574,-1.386],
// 2 16 -6.75 .574 -1.386 -6.5 1.061 -1.061
  [2,16,-6.75,.574,-1.386,-6.5,1.061,-1.061],
// 2 16 -6.5 1.061 -1.061 -6.25 1.386 -.574
  [2,16,-6.5,1.061,-1.061,-6.25,1.386,-.574],
// 2 16 -6.25 1.386 -.574 -6 1.5 0
  [2,16,-6.25,1.386,-.574,-6,1.5,0],
// 2 16 -6 1.5 0 -5.75 1.386 .574
  [2,16,-6,1.5,0,-5.75,1.386,.574],
// 2 16 -5.75 1.386 .574 -5.5 1.061 1.061
  [2,16,-5.75,1.386,.574,-5.5,1.061,1.061],
// 2 16 -5.5 1.061 1.061 -5.25 .574 1.386
  [2,16,-5.5,1.061,1.061,-5.25,.574,1.386],
// 2 16 -5.25 .574 1.386 -5 0 1.5
  [2,16,-5.25,.574,1.386,-5,0,1.5],
// 2 16 -5 0 1.5 -4.75 -.574 1.386
  [2,16,-5,0,1.5,-4.75,-.574,1.386],
// 2 16 -4.75 -.574 1.386 -4.5 -1.061 1.061
  [2,16,-4.75,-.574,1.386,-4.5,-1.061,1.061],
// 2 16 -4.5 -1.061 1.061 -4.25 -1.386 .574
  [2,16,-4.5,-1.061,1.061,-4.25,-1.386,.574],
// 2 16 -4.25 -1.386 .574 -4 -1.5 0
  [2,16,-4.25,-1.386,.574,-4,-1.5,0],
// 2 16 -4 -1.5 0 -3.75 -1.386 -.574
  [2,16,-4,-1.5,0,-3.75,-1.386,-.574],
// 2 16 -3.75 -1.386 -.574 -3.5 -1.061 -1.061
  [2,16,-3.75,-1.386,-.574,-3.5,-1.061,-1.061],
// 2 16 -3.5 -1.061 -1.061 -3.25 -.574 -1.386
  [2,16,-3.5,-1.061,-1.061,-3.25,-.574,-1.386],
// 2 16 -3.25 -.574 -1.386 -3 0 -1.5
  [2,16,-3.25,-.574,-1.386,-3,0,-1.5],
// 2 16 -3 0 -1.5 -2.75 .574 -1.386
  [2,16,-3,0,-1.5,-2.75,.574,-1.386],
// 2 16 -2.75 .574 -1.386 -2.5 1.061 -1.061
  [2,16,-2.75,.574,-1.386,-2.5,1.061,-1.061],
// 2 16 -2.5 1.061 -1.061 -2.25 1.386 -.574
  [2,16,-2.5,1.061,-1.061,-2.25,1.386,-.574],
// 2 16 -2.25 1.386 -.574 -2 1.5 0
  [2,16,-2.25,1.386,-.574,-2,1.5,0],
// 2 16 -2 1.5 0 -1.75 1.386 .574
  [2,16,-2,1.5,0,-1.75,1.386,.574],
// 2 16 -1.75 1.386 .574 -1.5 1.061 1.061
  [2,16,-1.75,1.386,.574,-1.5,1.061,1.061],
// 2 16 -1.5 1.061 1.061 -1.25 .574 1.386
  [2,16,-1.5,1.061,1.061,-1.25,.574,1.386],
// 2 16 -1.25 .574 1.386 -1 0 1.5
  [2,16,-1.25,.574,1.386,-1,0,1.5],
// 2 16 -1 0 1.5 -.75 -.574 1.386
  [2,16,-1,0,1.5,-.75,-.574,1.386],
// 2 16 -.75 -.574 1.386 -.5 -1.061 1.061
  [2,16,-.75,-.574,1.386,-.5,-1.061,1.061],
// 2 16 -.5 -1.061 1.061 -.25 -1.386 .574
  [2,16,-.5,-1.061,1.061,-.25,-1.386,.574],
// 2 16 -.25 -1.386 .574 0 -1.5 0
  [2,16,-.25,-1.386,.574,0,-1.5,0],
// 2 16 0 -1.5 0 .25 -1.386 -.574
  [2,16,0,-1.5,0,.25,-1.386,-.574],
// 2 16 .25 -1.386 -.574 .5 -1.061 -1.061
  [2,16,.25,-1.386,-.574,.5,-1.061,-1.061],
// 2 16 .5 -1.061 -1.061 .75 -.574 -1.386
  [2,16,.5,-1.061,-1.061,.75,-.574,-1.386],
// 2 16 .75 -.574 -1.386 1 0 -1.5
  [2,16,.75,-.574,-1.386,1,0,-1.5],
// 2 16 1 0 -1.5 1.25 .574 -1.386
  [2,16,1,0,-1.5,1.25,.574,-1.386],
// 2 16 1.25 .574 -1.386 1.5 1.061 -1.061
  [2,16,1.25,.574,-1.386,1.5,1.061,-1.061],
// 2 16 1.5 1.061 -1.061 1.75 1.386 -.574
  [2,16,1.5,1.061,-1.061,1.75,1.386,-.574],
// 2 16 1.75 1.386 -.574 2 1.5 0
  [2,16,1.75,1.386,-.574,2,1.5,0],
// 2 16 2 1.5 0 2.25 1.386 .574
  [2,16,2,1.5,0,2.25,1.386,.574],
// 2 16 2.25 1.386 .574 2.5 1.061 1.061
  [2,16,2.25,1.386,.574,2.5,1.061,1.061],
// 2 16 2.5 1.061 1.061 2.75 .574 1.386
  [2,16,2.5,1.061,1.061,2.75,.574,1.386],
// 2 16 2.75 .574 1.386 3 0 1.5
  [2,16,2.75,.574,1.386,3,0,1.5],
// 2 16 3 0 1.5 3.25 -.574 1.386
  [2,16,3,0,1.5,3.25,-.574,1.386],
// 2 16 3.25 -.574 1.386 3.5 -1.061 1.061
  [2,16,3.25,-.574,1.386,3.5,-1.061,1.061],
// 2 16 3.5 -1.061 1.061 3.75 -1.386 .574
  [2,16,3.5,-1.061,1.061,3.75,-1.386,.574],
// 2 16 3.75 -1.386 .574 4 -1.5 0
  [2,16,3.75,-1.386,.574,4,-1.5,0],
// 2 16 4 -1.5 0 4.25 -1.386 -.574
  [2,16,4,-1.5,0,4.25,-1.386,-.574],
// 2 16 4.25 -1.386 -.574 4.5 -1.061 -1.061
  [2,16,4.25,-1.386,-.574,4.5,-1.061,-1.061],
// 2 16 4.5 -1.061 -1.061 4.75 -.574 -1.386
  [2,16,4.5,-1.061,-1.061,4.75,-.574,-1.386],
// 2 16 4.75 -.574 -1.386 5 0 -1.5
  [2,16,4.75,-.574,-1.386,5,0,-1.5],
// 2 16 5 0 -1.5 5.25 .574 -1.386
  [2,16,5,0,-1.5,5.25,.574,-1.386],
// 2 16 5.25 .574 -1.386 5.5 1.061 -1.061
  [2,16,5.25,.574,-1.386,5.5,1.061,-1.061],
// 2 16 5.5 1.061 -1.061 5.75 1.386 -.574
  [2,16,5.5,1.061,-1.061,5.75,1.386,-.574],
// 2 16 5.75 1.386 -.574 6 1.5 0
  [2,16,5.75,1.386,-.574,6,1.5,0],
// 2 16 6 1.5 0 6.25 1.386 .574
  [2,16,6,1.5,0,6.25,1.386,.574],
// 2 16 6.25 1.386 .574 6.5 1.061 1.061
  [2,16,6.25,1.386,.574,6.5,1.061,1.061],
// 2 16 6.5 1.061 1.061 6.75 .574 1.386
  [2,16,6.5,1.061,1.061,6.75,.574,1.386],
// 2 16 6.75 .574 1.386 7 0 1.5
  [2,16,6.75,.574,1.386,7,0,1.5],
// 2 16 7 0 1.5 7.25 -.574 1.386
  [2,16,7,0,1.5,7.25,-.574,1.386],
// 2 16 7.25 -.574 1.386 7.5 -1.061 1.061
  [2,16,7.25,-.574,1.386,7.5,-1.061,1.061],
// 2 16 7.5 -1.061 1.061 7.75 -1.386 .574
  [2,16,7.5,-1.061,1.061,7.75,-1.386,.574],
// 2 16 7.75 -1.386 .574 8 -1.5 0
  [2,16,7.75,-1.386,.574,8,-1.5,0],
// 2 16 8 -1.5 0 8.25 -1.386 -.574
  [2,16,8,-1.5,0,8.25,-1.386,-.574],
// 2 16 8.25 -1.386 -.574 8.5 -1.061 -1.061
  [2,16,8.25,-1.386,-.574,8.5,-1.061,-1.061],
// 2 16 8.5 -1.061 -1.061 8.75 -.574 -1.386
  [2,16,8.5,-1.061,-1.061,8.75,-.574,-1.386],
// 2 16 8.75 -.574 -1.386 9 0 -1.5
  [2,16,8.75,-.574,-1.386,9,0,-1.5],
// 2 16 9 0 -1.5 9.25 .574 -1.386
  [2,16,9,0,-1.5,9.25,.574,-1.386],
// 2 16 9.25 .574 -1.386 9.5 1.061 -1.061
  [2,16,9.25,.574,-1.386,9.5,1.061,-1.061],
// 2 16 9.5 1.061 -1.061 9.75 1.386 -.574
  [2,16,9.5,1.061,-1.061,9.75,1.386,-.574],
// 2 16 9.75 1.386 -.574 10 1.5 0
  [2,16,9.75,1.386,-.574,10,1.5,0],
// 2 16 -10 -1.5 0 -9.75 -1.386 .574
  [2,16,-10,-1.5,0,-9.75,-1.386,.574],
// 2 16 -9.75 -1.386 .574 -9.5 -1.061 1.061
  [2,16,-9.75,-1.386,.574,-9.5,-1.061,1.061],
// 2 16 -9.5 -1.061 1.061 -9.25 -.574 1.386
  [2,16,-9.5,-1.061,1.061,-9.25,-.574,1.386],
// 2 16 -9.25 -.574 1.386 -9 0 1.5
  [2,16,-9.25,-.574,1.386,-9,0,1.5],
// 2 16 -9 0 1.5 -8.75 .574 1.386
  [2,16,-9,0,1.5,-8.75,.574,1.386],
// 2 16 -8.75 .574 1.386 -8.5 1.061 1.061
  [2,16,-8.75,.574,1.386,-8.5,1.061,1.061],
// 2 16 -8.5 1.061 1.061 -8.25 1.386 .574
  [2,16,-8.5,1.061,1.061,-8.25,1.386,.574],
// 2 16 -8.25 1.386 .574 -8 1.5 0
  [2,16,-8.25,1.386,.574,-8,1.5,0],
// 2 16 -8 1.5 0 -7.75 1.386 -.574
  [2,16,-8,1.5,0,-7.75,1.386,-.574],
// 2 16 -7.75 1.386 -.574 -7.5 1.061 -1.061
  [2,16,-7.75,1.386,-.574,-7.5,1.061,-1.061],
// 2 16 -7.5 1.061 -1.061 -7.25 .574 -1.386
  [2,16,-7.5,1.061,-1.061,-7.25,.574,-1.386],
// 2 16 -7.25 .574 -1.386 -7 0 -1.5
  [2,16,-7.25,.574,-1.386,-7,0,-1.5],
// 2 16 -7 0 -1.5 -6.75 -.574 -1.386
  [2,16,-7,0,-1.5,-6.75,-.574,-1.386],
// 2 16 -6.75 -.574 -1.386 -6.5 -1.061 -1.061
  [2,16,-6.75,-.574,-1.386,-6.5,-1.061,-1.061],
// 2 16 -6.5 -1.061 -1.061 -6.25 -1.386 -.574
  [2,16,-6.5,-1.061,-1.061,-6.25,-1.386,-.574],
// 2 16 -6.25 -1.386 -.574 -6 -1.5 0
  [2,16,-6.25,-1.386,-.574,-6,-1.5,0],
// 2 16 -6 -1.5 0 -5.75 -1.386 .574
  [2,16,-6,-1.5,0,-5.75,-1.386,.574],
// 2 16 -5.75 -1.386 .574 -5.5 -1.061 1.061
  [2,16,-5.75,-1.386,.574,-5.5,-1.061,1.061],
// 2 16 -5.5 -1.061 1.061 -5.25 -.574 1.386
  [2,16,-5.5,-1.061,1.061,-5.25,-.574,1.386],
// 2 16 -5.25 -.574 1.386 -5 0 1.5
  [2,16,-5.25,-.574,1.386,-5,0,1.5],
// 2 16 -5 0 1.5 -4.75 .574 1.386
  [2,16,-5,0,1.5,-4.75,.574,1.386],
// 2 16 -4.75 .574 1.386 -4.5 1.061 1.061
  [2,16,-4.75,.574,1.386,-4.5,1.061,1.061],
// 2 16 -4.5 1.061 1.061 -4.25 1.386 .574
  [2,16,-4.5,1.061,1.061,-4.25,1.386,.574],
// 2 16 -4.25 1.386 .574 -4 1.5 0
  [2,16,-4.25,1.386,.574,-4,1.5,0],
// 2 16 -4 1.5 0 -3.75 1.386 -.574
  [2,16,-4,1.5,0,-3.75,1.386,-.574],
// 2 16 -3.75 1.386 -.574 -3.5 1.061 -1.061
  [2,16,-3.75,1.386,-.574,-3.5,1.061,-1.061],
// 2 16 -3.5 1.061 -1.061 -3.25 .574 -1.386
  [2,16,-3.5,1.061,-1.061,-3.25,.574,-1.386],
// 2 16 -3.25 .574 -1.386 -3 0 -1.5
  [2,16,-3.25,.574,-1.386,-3,0,-1.5],
// 2 16 -3 0 -1.5 -2.75 -.574 -1.386
  [2,16,-3,0,-1.5,-2.75,-.574,-1.386],
// 2 16 -2.75 -.574 -1.386 -2.5 -1.061 -1.061
  [2,16,-2.75,-.574,-1.386,-2.5,-1.061,-1.061],
// 2 16 -2.5 -1.061 -1.061 -2.25 -1.386 -.574
  [2,16,-2.5,-1.061,-1.061,-2.25,-1.386,-.574],
// 2 16 -2.25 -1.386 -.574 -2 -1.5 0
  [2,16,-2.25,-1.386,-.574,-2,-1.5,0],
// 2 16 -2 -1.5 0 -1.75 -1.386 .574
  [2,16,-2,-1.5,0,-1.75,-1.386,.574],
// 2 16 -1.75 -1.386 .574 -1.5 -1.061 1.061
  [2,16,-1.75,-1.386,.574,-1.5,-1.061,1.061],
// 2 16 -1.5 -1.061 1.061 -1.25 -.574 1.386
  [2,16,-1.5,-1.061,1.061,-1.25,-.574,1.386],
// 2 16 -1.25 -.574 1.386 -1 0 1.5
  [2,16,-1.25,-.574,1.386,-1,0,1.5],
// 2 16 -1 0 1.5 -.75 .574 1.386
  [2,16,-1,0,1.5,-.75,.574,1.386],
// 2 16 -.75 .574 1.386 -.5 1.061 1.061
  [2,16,-.75,.574,1.386,-.5,1.061,1.061],
// 2 16 -.5 1.061 1.061 -.25 1.386 .574
  [2,16,-.5,1.061,1.061,-.25,1.386,.574],
// 2 16 -.25 1.386 .574 0 1.5 0
  [2,16,-.25,1.386,.574,0,1.5,0],
// 2 16 0 1.5 0 .25 1.386 -.574
  [2,16,0,1.5,0,.25,1.386,-.574],
// 2 16 .25 1.386 -.574 .5 1.061 -1.061
  [2,16,.25,1.386,-.574,.5,1.061,-1.061],
// 2 16 .5 1.061 -1.061 .75 .574 -1.386
  [2,16,.5,1.061,-1.061,.75,.574,-1.386],
// 2 16 .75 .574 -1.386 1 0 -1.5
  [2,16,.75,.574,-1.386,1,0,-1.5],
// 2 16 1 0 -1.5 1.25 -.574 -1.386
  [2,16,1,0,-1.5,1.25,-.574,-1.386],
// 2 16 1.25 -.574 -1.386 1.5 -1.061 -1.061
  [2,16,1.25,-.574,-1.386,1.5,-1.061,-1.061],
// 2 16 1.5 -1.061 -1.061 1.75 -1.386 -.574
  [2,16,1.5,-1.061,-1.061,1.75,-1.386,-.574],
// 2 16 1.75 -1.386 -.574 2 -1.5 0
  [2,16,1.75,-1.386,-.574,2,-1.5,0],
// 2 16 2 -1.5 0 2.25 -1.386 .574
  [2,16,2,-1.5,0,2.25,-1.386,.574],
// 2 16 2.25 -1.386 .574 2.5 -1.061 1.061
  [2,16,2.25,-1.386,.574,2.5,-1.061,1.061],
// 2 16 2.5 -1.061 1.061 2.75 -.574 1.386
  [2,16,2.5,-1.061,1.061,2.75,-.574,1.386],
// 2 16 2.75 -.574 1.386 3 0 1.5
  [2,16,2.75,-.574,1.386,3,0,1.5],
// 2 16 3 0 1.5 3.25 .574 1.386
  [2,16,3,0,1.5,3.25,.574,1.386],
// 2 16 3.25 .574 1.386 3.5 1.061 1.061
  [2,16,3.25,.574,1.386,3.5,1.061,1.061],
// 2 16 3.5 1.061 1.061 3.75 1.386 .574
  [2,16,3.5,1.061,1.061,3.75,1.386,.574],
// 2 16 3.75 1.386 .574 4 1.5 0
  [2,16,3.75,1.386,.574,4,1.5,0],
// 2 16 4 1.5 0 4.25 1.386 -.574
  [2,16,4,1.5,0,4.25,1.386,-.574],
// 2 16 4.25 1.386 -.574 4.5 1.061 -1.061
  [2,16,4.25,1.386,-.574,4.5,1.061,-1.061],
// 2 16 4.5 1.061 -1.061 4.75 .574 -1.386
  [2,16,4.5,1.061,-1.061,4.75,.574,-1.386],
// 2 16 4.75 .574 -1.386 5 0 -1.5
  [2,16,4.75,.574,-1.386,5,0,-1.5],
// 2 16 5 0 -1.5 5.25 -.574 -1.386
  [2,16,5,0,-1.5,5.25,-.574,-1.386],
// 2 16 5.25 -.574 -1.386 5.5 -1.061 -1.061
  [2,16,5.25,-.574,-1.386,5.5,-1.061,-1.061],
// 2 16 5.5 -1.061 -1.061 5.75 -1.386 -.574
  [2,16,5.5,-1.061,-1.061,5.75,-1.386,-.574],
// 2 16 5.75 -1.386 -.574 6 -1.5 0
  [2,16,5.75,-1.386,-.574,6,-1.5,0],
// 2 16 6 -1.5 0 6.25 -1.386 .574
  [2,16,6,-1.5,0,6.25,-1.386,.574],
// 2 16 6.25 -1.386 .574 6.5 -1.061 1.061
  [2,16,6.25,-1.386,.574,6.5,-1.061,1.061],
// 2 16 6.5 -1.061 1.061 6.75 -.574 1.386
  [2,16,6.5,-1.061,1.061,6.75,-.574,1.386],
// 2 16 6.75 -.574 1.386 7 0 1.5
  [2,16,6.75,-.574,1.386,7,0,1.5],
// 2 16 7 0 1.5 7.25 .574 1.386
  [2,16,7,0,1.5,7.25,.574,1.386],
// 2 16 7.25 .574 1.386 7.5 1.061 1.061
  [2,16,7.25,.574,1.386,7.5,1.061,1.061],
// 2 16 7.5 1.061 1.061 7.75 1.386 .574
  [2,16,7.5,1.061,1.061,7.75,1.386,.574],
// 2 16 7.75 1.386 .574 8 1.5 0
  [2,16,7.75,1.386,.574,8,1.5,0],
// 2 16 8 1.5 0 8.25 1.386 -.574
  [2,16,8,1.5,0,8.25,1.386,-.574],
// 2 16 8.25 1.386 -.574 8.5 1.061 -1.061
  [2,16,8.25,1.386,-.574,8.5,1.061,-1.061],
// 2 16 8.5 1.061 -1.061 8.75 .574 -1.386
  [2,16,8.5,1.061,-1.061,8.75,.574,-1.386],
// 2 16 8.75 .574 -1.386 9 0 -1.5
  [2,16,8.75,.574,-1.386,9,0,-1.5],
// 2 16 9 0 -1.5 9.25 -.574 -1.386
  [2,16,9,0,-1.5,9.25,-.574,-1.386],
// 2 16 9.25 -.574 -1.386 9.5 -1.061 -1.061
  [2,16,9.25,-.574,-1.386,9.5,-1.061,-1.061],
// 2 16 9.5 -1.061 -1.061 9.75 -1.386 -.574
  [2,16,9.5,-1.061,-1.061,9.75,-1.386,-.574],
// 2 16 9.75 -1.386 -.574 10 -1.5 0
  [2,16,9.75,-1.386,-.574,10,-1.5,0],
// 2 16 -10 1.5 0 -9.75 1.386 -.574
  [2,16,-10,1.5,0,-9.75,1.386,-.574],
// 2 16 -9.75 1.386 -.574 -9.5 1.061 -1.061
  [2,16,-9.75,1.386,-.574,-9.5,1.061,-1.061],
// 2 16 -9.5 1.061 -1.061 -9.25 .574 -1.386
  [2,16,-9.5,1.061,-1.061,-9.25,.574,-1.386],
// 2 16 -9.25 .574 -1.386 -9 0 -1.5
  [2,16,-9.25,.574,-1.386,-9,0,-1.5],
// 2 16 -9 0 -1.5 -8.75 -.574 -1.386
  [2,16,-9,0,-1.5,-8.75,-.574,-1.386],
// 2 16 -8.75 -.574 -1.386 -8.5 -1.061 -1.061
  [2,16,-8.75,-.574,-1.386,-8.5,-1.061,-1.061],
// 2 16 -8.5 -1.061 -1.061 -8.25 -1.386 -.574
  [2,16,-8.5,-1.061,-1.061,-8.25,-1.386,-.574],
// 2 16 -8.25 -1.386 -.574 -8 -1.5 0
  [2,16,-8.25,-1.386,-.574,-8,-1.5,0],
// 2 16 -8 -1.5 0 -7.75 -1.386 .574
  [2,16,-8,-1.5,0,-7.75,-1.386,.574],
// 2 16 -7.75 -1.386 .574 -7.5 -1.061 1.061
  [2,16,-7.75,-1.386,.574,-7.5,-1.061,1.061],
// 2 16 -7.5 -1.061 1.061 -7.25 -.574 1.386
  [2,16,-7.5,-1.061,1.061,-7.25,-.574,1.386],
// 2 16 -7.25 -.574 1.386 -7 0 1.5
  [2,16,-7.25,-.574,1.386,-7,0,1.5],
// 2 16 -7 0 1.5 -6.75 .574 1.386
  [2,16,-7,0,1.5,-6.75,.574,1.386],
// 2 16 -6.75 .574 1.386 -6.5 1.061 1.061
  [2,16,-6.75,.574,1.386,-6.5,1.061,1.061],
// 2 16 -6.5 1.061 1.061 -6.25 1.386 .574
  [2,16,-6.5,1.061,1.061,-6.25,1.386,.574],
// 2 16 -6.25 1.386 .574 -6 1.5 0
  [2,16,-6.25,1.386,.574,-6,1.5,0],
// 2 16 -6 1.5 0 -5.75 1.386 -.574
  [2,16,-6,1.5,0,-5.75,1.386,-.574],
// 2 16 -5.75 1.386 -.574 -5.5 1.061 -1.061
  [2,16,-5.75,1.386,-.574,-5.5,1.061,-1.061],
// 2 16 -5.5 1.061 -1.061 -5.25 .574 -1.386
  [2,16,-5.5,1.061,-1.061,-5.25,.574,-1.386],
// 2 16 -5.25 .574 -1.386 -5 0 -1.5
  [2,16,-5.25,.574,-1.386,-5,0,-1.5],
// 2 16 -5 0 -1.5 -4.75 -.574 -1.386
  [2,16,-5,0,-1.5,-4.75,-.574,-1.386],
// 2 16 -4.75 -.574 -1.386 -4.5 -1.061 -1.061
  [2,16,-4.75,-.574,-1.386,-4.5,-1.061,-1.061],
// 2 16 -4.5 -1.061 -1.061 -4.25 -1.386 -.574
  [2,16,-4.5,-1.061,-1.061,-4.25,-1.386,-.574],
// 2 16 -4.25 -1.386 -.574 -4 -1.5 0
  [2,16,-4.25,-1.386,-.574,-4,-1.5,0],
// 2 16 -4 -1.5 0 -3.75 -1.386 .574
  [2,16,-4,-1.5,0,-3.75,-1.386,.574],
// 2 16 -3.75 -1.386 .574 -3.5 -1.061 1.061
  [2,16,-3.75,-1.386,.574,-3.5,-1.061,1.061],
// 2 16 -3.5 -1.061 1.061 -3.25 -.574 1.386
  [2,16,-3.5,-1.061,1.061,-3.25,-.574,1.386],
// 2 16 -3.25 -.574 1.386 -3 0 1.5
  [2,16,-3.25,-.574,1.386,-3,0,1.5],
// 2 16 -3 0 1.5 -2.75 .574 1.386
  [2,16,-3,0,1.5,-2.75,.574,1.386],
// 2 16 -2.75 .574 1.386 -2.5 1.061 1.061
  [2,16,-2.75,.574,1.386,-2.5,1.061,1.061],
// 2 16 -2.5 1.061 1.061 -2.25 1.386 .574
  [2,16,-2.5,1.061,1.061,-2.25,1.386,.574],
// 2 16 -2.25 1.386 .574 -2 1.5 0
  [2,16,-2.25,1.386,.574,-2,1.5,0],
// 2 16 -2 1.5 0 -1.75 1.386 -.574
  [2,16,-2,1.5,0,-1.75,1.386,-.574],
// 2 16 -1.75 1.386 -.574 -1.5 1.061 -1.061
  [2,16,-1.75,1.386,-.574,-1.5,1.061,-1.061],
// 2 16 -1.5 1.061 -1.061 -1.25 .574 -1.386
  [2,16,-1.5,1.061,-1.061,-1.25,.574,-1.386],
// 2 16 -1.25 .574 -1.386 -1 0 -1.5
  [2,16,-1.25,.574,-1.386,-1,0,-1.5],
// 2 16 -1 0 -1.5 -.75 -.574 -1.386
  [2,16,-1,0,-1.5,-.75,-.574,-1.386],
// 2 16 -.75 -.574 -1.386 -.5 -1.061 -1.061
  [2,16,-.75,-.574,-1.386,-.5,-1.061,-1.061],
// 2 16 -.5 -1.061 -1.061 -.25 -1.386 -.574
  [2,16,-.5,-1.061,-1.061,-.25,-1.386,-.574],
// 2 16 -.25 -1.386 -.574 0 -1.5 0
  [2,16,-.25,-1.386,-.574,0,-1.5,0],
// 2 16 0 -1.5 0 .25 -1.386 .574
  [2,16,0,-1.5,0,.25,-1.386,.574],
// 2 16 .25 -1.386 .574 .5 -1.061 1.061
  [2,16,.25,-1.386,.574,.5,-1.061,1.061],
// 2 16 .5 -1.061 1.061 .75 -.574 1.386
  [2,16,.5,-1.061,1.061,.75,-.574,1.386],
// 2 16 .75 -.574 1.386 1 0 1.5
  [2,16,.75,-.574,1.386,1,0,1.5],
// 2 16 1 0 1.5 1.25 .574 1.386
  [2,16,1,0,1.5,1.25,.574,1.386],
// 2 16 1.25 .574 1.386 1.5 1.061 1.061
  [2,16,1.25,.574,1.386,1.5,1.061,1.061],
// 2 16 1.5 1.061 1.061 1.75 1.386 .574
  [2,16,1.5,1.061,1.061,1.75,1.386,.574],
// 2 16 1.75 1.386 .574 2 1.5 0
  [2,16,1.75,1.386,.574,2,1.5,0],
// 2 16 2 1.5 0 2.25 1.386 -.574
  [2,16,2,1.5,0,2.25,1.386,-.574],
// 2 16 2.25 1.386 -.574 2.5 1.061 -1.061
  [2,16,2.25,1.386,-.574,2.5,1.061,-1.061],
// 2 16 2.5 1.061 -1.061 2.75 .574 -1.386
  [2,16,2.5,1.061,-1.061,2.75,.574,-1.386],
// 2 16 2.75 .574 -1.386 3 0 -1.5
  [2,16,2.75,.574,-1.386,3,0,-1.5],
// 2 16 3 0 -1.5 3.25 -.574 -1.386
  [2,16,3,0,-1.5,3.25,-.574,-1.386],
// 2 16 3.25 -.574 -1.386 3.5 -1.061 -1.061
  [2,16,3.25,-.574,-1.386,3.5,-1.061,-1.061],
// 2 16 3.5 -1.061 -1.061 3.75 -1.386 -.574
  [2,16,3.5,-1.061,-1.061,3.75,-1.386,-.574],
// 2 16 3.75 -1.386 -.574 4 -1.5 0
  [2,16,3.75,-1.386,-.574,4,-1.5,0],
// 2 16 4 -1.5 0 4.25 -1.386 .574
  [2,16,4,-1.5,0,4.25,-1.386,.574],
// 2 16 4.25 -1.386 .574 4.5 -1.061 1.061
  [2,16,4.25,-1.386,.574,4.5,-1.061,1.061],
// 2 16 4.5 -1.061 1.061 4.75 -.574 1.386
  [2,16,4.5,-1.061,1.061,4.75,-.574,1.386],
// 2 16 4.75 -.574 1.386 5 0 1.5
  [2,16,4.75,-.574,1.386,5,0,1.5],
// 2 16 5 0 1.5 5.25 .574 1.386
  [2,16,5,0,1.5,5.25,.574,1.386],
// 2 16 5.25 .574 1.386 5.5 1.061 1.061
  [2,16,5.25,.574,1.386,5.5,1.061,1.061],
// 2 16 5.5 1.061 1.061 5.75 1.386 .574
  [2,16,5.5,1.061,1.061,5.75,1.386,.574],
// 2 16 5.75 1.386 .574 6 1.5 0
  [2,16,5.75,1.386,.574,6,1.5,0],
// 2 16 6 1.5 0 6.25 1.386 -.574
  [2,16,6,1.5,0,6.25,1.386,-.574],
// 2 16 6.25 1.386 -.574 6.5 1.061 -1.061
  [2,16,6.25,1.386,-.574,6.5,1.061,-1.061],
// 2 16 6.5 1.061 -1.061 6.75 .574 -1.386
  [2,16,6.5,1.061,-1.061,6.75,.574,-1.386],
// 2 16 6.75 .574 -1.386 7 0 -1.5
  [2,16,6.75,.574,-1.386,7,0,-1.5],
// 2 16 7 0 -1.5 7.25 -.574 -1.386
  [2,16,7,0,-1.5,7.25,-.574,-1.386],
// 2 16 7.25 -.574 -1.386 7.5 -1.061 -1.061
  [2,16,7.25,-.574,-1.386,7.5,-1.061,-1.061],
// 2 16 7.5 -1.061 -1.061 7.75 -1.386 -.574
  [2,16,7.5,-1.061,-1.061,7.75,-1.386,-.574],
// 2 16 7.75 -1.386 -.574 8 -1.5 0
  [2,16,7.75,-1.386,-.574,8,-1.5,0],
// 2 16 8 -1.5 0 8.25 -1.386 .574
  [2,16,8,-1.5,0,8.25,-1.386,.574],
// 2 16 8.25 -1.386 .574 8.5 -1.061 1.061
  [2,16,8.25,-1.386,.574,8.5,-1.061,1.061],
// 2 16 8.5 -1.061 1.061 8.75 -.574 1.386
  [2,16,8.5,-1.061,1.061,8.75,-.574,1.386],
// 2 16 8.75 -.574 1.386 9 0 1.5
  [2,16,8.75,-.574,1.386,9,0,1.5],
// 2 16 9 0 1.5 9.25 .574 1.386
  [2,16,9,0,1.5,9.25,.574,1.386],
// 2 16 9.25 .574 1.386 9.5 1.061 1.061
  [2,16,9.25,.574,1.386,9.5,1.061,1.061],
// 2 16 9.5 1.061 1.061 9.75 1.386 .574
  [2,16,9.5,1.061,1.061,9.75,1.386,.574],
// 2 16 9.75 1.386 .574 10 1.5 0
  [2,16,9.75,1.386,.574,10,1.5,0],
// 0
];
makepoly(ldraw_lib__572b(), line=0.2);
